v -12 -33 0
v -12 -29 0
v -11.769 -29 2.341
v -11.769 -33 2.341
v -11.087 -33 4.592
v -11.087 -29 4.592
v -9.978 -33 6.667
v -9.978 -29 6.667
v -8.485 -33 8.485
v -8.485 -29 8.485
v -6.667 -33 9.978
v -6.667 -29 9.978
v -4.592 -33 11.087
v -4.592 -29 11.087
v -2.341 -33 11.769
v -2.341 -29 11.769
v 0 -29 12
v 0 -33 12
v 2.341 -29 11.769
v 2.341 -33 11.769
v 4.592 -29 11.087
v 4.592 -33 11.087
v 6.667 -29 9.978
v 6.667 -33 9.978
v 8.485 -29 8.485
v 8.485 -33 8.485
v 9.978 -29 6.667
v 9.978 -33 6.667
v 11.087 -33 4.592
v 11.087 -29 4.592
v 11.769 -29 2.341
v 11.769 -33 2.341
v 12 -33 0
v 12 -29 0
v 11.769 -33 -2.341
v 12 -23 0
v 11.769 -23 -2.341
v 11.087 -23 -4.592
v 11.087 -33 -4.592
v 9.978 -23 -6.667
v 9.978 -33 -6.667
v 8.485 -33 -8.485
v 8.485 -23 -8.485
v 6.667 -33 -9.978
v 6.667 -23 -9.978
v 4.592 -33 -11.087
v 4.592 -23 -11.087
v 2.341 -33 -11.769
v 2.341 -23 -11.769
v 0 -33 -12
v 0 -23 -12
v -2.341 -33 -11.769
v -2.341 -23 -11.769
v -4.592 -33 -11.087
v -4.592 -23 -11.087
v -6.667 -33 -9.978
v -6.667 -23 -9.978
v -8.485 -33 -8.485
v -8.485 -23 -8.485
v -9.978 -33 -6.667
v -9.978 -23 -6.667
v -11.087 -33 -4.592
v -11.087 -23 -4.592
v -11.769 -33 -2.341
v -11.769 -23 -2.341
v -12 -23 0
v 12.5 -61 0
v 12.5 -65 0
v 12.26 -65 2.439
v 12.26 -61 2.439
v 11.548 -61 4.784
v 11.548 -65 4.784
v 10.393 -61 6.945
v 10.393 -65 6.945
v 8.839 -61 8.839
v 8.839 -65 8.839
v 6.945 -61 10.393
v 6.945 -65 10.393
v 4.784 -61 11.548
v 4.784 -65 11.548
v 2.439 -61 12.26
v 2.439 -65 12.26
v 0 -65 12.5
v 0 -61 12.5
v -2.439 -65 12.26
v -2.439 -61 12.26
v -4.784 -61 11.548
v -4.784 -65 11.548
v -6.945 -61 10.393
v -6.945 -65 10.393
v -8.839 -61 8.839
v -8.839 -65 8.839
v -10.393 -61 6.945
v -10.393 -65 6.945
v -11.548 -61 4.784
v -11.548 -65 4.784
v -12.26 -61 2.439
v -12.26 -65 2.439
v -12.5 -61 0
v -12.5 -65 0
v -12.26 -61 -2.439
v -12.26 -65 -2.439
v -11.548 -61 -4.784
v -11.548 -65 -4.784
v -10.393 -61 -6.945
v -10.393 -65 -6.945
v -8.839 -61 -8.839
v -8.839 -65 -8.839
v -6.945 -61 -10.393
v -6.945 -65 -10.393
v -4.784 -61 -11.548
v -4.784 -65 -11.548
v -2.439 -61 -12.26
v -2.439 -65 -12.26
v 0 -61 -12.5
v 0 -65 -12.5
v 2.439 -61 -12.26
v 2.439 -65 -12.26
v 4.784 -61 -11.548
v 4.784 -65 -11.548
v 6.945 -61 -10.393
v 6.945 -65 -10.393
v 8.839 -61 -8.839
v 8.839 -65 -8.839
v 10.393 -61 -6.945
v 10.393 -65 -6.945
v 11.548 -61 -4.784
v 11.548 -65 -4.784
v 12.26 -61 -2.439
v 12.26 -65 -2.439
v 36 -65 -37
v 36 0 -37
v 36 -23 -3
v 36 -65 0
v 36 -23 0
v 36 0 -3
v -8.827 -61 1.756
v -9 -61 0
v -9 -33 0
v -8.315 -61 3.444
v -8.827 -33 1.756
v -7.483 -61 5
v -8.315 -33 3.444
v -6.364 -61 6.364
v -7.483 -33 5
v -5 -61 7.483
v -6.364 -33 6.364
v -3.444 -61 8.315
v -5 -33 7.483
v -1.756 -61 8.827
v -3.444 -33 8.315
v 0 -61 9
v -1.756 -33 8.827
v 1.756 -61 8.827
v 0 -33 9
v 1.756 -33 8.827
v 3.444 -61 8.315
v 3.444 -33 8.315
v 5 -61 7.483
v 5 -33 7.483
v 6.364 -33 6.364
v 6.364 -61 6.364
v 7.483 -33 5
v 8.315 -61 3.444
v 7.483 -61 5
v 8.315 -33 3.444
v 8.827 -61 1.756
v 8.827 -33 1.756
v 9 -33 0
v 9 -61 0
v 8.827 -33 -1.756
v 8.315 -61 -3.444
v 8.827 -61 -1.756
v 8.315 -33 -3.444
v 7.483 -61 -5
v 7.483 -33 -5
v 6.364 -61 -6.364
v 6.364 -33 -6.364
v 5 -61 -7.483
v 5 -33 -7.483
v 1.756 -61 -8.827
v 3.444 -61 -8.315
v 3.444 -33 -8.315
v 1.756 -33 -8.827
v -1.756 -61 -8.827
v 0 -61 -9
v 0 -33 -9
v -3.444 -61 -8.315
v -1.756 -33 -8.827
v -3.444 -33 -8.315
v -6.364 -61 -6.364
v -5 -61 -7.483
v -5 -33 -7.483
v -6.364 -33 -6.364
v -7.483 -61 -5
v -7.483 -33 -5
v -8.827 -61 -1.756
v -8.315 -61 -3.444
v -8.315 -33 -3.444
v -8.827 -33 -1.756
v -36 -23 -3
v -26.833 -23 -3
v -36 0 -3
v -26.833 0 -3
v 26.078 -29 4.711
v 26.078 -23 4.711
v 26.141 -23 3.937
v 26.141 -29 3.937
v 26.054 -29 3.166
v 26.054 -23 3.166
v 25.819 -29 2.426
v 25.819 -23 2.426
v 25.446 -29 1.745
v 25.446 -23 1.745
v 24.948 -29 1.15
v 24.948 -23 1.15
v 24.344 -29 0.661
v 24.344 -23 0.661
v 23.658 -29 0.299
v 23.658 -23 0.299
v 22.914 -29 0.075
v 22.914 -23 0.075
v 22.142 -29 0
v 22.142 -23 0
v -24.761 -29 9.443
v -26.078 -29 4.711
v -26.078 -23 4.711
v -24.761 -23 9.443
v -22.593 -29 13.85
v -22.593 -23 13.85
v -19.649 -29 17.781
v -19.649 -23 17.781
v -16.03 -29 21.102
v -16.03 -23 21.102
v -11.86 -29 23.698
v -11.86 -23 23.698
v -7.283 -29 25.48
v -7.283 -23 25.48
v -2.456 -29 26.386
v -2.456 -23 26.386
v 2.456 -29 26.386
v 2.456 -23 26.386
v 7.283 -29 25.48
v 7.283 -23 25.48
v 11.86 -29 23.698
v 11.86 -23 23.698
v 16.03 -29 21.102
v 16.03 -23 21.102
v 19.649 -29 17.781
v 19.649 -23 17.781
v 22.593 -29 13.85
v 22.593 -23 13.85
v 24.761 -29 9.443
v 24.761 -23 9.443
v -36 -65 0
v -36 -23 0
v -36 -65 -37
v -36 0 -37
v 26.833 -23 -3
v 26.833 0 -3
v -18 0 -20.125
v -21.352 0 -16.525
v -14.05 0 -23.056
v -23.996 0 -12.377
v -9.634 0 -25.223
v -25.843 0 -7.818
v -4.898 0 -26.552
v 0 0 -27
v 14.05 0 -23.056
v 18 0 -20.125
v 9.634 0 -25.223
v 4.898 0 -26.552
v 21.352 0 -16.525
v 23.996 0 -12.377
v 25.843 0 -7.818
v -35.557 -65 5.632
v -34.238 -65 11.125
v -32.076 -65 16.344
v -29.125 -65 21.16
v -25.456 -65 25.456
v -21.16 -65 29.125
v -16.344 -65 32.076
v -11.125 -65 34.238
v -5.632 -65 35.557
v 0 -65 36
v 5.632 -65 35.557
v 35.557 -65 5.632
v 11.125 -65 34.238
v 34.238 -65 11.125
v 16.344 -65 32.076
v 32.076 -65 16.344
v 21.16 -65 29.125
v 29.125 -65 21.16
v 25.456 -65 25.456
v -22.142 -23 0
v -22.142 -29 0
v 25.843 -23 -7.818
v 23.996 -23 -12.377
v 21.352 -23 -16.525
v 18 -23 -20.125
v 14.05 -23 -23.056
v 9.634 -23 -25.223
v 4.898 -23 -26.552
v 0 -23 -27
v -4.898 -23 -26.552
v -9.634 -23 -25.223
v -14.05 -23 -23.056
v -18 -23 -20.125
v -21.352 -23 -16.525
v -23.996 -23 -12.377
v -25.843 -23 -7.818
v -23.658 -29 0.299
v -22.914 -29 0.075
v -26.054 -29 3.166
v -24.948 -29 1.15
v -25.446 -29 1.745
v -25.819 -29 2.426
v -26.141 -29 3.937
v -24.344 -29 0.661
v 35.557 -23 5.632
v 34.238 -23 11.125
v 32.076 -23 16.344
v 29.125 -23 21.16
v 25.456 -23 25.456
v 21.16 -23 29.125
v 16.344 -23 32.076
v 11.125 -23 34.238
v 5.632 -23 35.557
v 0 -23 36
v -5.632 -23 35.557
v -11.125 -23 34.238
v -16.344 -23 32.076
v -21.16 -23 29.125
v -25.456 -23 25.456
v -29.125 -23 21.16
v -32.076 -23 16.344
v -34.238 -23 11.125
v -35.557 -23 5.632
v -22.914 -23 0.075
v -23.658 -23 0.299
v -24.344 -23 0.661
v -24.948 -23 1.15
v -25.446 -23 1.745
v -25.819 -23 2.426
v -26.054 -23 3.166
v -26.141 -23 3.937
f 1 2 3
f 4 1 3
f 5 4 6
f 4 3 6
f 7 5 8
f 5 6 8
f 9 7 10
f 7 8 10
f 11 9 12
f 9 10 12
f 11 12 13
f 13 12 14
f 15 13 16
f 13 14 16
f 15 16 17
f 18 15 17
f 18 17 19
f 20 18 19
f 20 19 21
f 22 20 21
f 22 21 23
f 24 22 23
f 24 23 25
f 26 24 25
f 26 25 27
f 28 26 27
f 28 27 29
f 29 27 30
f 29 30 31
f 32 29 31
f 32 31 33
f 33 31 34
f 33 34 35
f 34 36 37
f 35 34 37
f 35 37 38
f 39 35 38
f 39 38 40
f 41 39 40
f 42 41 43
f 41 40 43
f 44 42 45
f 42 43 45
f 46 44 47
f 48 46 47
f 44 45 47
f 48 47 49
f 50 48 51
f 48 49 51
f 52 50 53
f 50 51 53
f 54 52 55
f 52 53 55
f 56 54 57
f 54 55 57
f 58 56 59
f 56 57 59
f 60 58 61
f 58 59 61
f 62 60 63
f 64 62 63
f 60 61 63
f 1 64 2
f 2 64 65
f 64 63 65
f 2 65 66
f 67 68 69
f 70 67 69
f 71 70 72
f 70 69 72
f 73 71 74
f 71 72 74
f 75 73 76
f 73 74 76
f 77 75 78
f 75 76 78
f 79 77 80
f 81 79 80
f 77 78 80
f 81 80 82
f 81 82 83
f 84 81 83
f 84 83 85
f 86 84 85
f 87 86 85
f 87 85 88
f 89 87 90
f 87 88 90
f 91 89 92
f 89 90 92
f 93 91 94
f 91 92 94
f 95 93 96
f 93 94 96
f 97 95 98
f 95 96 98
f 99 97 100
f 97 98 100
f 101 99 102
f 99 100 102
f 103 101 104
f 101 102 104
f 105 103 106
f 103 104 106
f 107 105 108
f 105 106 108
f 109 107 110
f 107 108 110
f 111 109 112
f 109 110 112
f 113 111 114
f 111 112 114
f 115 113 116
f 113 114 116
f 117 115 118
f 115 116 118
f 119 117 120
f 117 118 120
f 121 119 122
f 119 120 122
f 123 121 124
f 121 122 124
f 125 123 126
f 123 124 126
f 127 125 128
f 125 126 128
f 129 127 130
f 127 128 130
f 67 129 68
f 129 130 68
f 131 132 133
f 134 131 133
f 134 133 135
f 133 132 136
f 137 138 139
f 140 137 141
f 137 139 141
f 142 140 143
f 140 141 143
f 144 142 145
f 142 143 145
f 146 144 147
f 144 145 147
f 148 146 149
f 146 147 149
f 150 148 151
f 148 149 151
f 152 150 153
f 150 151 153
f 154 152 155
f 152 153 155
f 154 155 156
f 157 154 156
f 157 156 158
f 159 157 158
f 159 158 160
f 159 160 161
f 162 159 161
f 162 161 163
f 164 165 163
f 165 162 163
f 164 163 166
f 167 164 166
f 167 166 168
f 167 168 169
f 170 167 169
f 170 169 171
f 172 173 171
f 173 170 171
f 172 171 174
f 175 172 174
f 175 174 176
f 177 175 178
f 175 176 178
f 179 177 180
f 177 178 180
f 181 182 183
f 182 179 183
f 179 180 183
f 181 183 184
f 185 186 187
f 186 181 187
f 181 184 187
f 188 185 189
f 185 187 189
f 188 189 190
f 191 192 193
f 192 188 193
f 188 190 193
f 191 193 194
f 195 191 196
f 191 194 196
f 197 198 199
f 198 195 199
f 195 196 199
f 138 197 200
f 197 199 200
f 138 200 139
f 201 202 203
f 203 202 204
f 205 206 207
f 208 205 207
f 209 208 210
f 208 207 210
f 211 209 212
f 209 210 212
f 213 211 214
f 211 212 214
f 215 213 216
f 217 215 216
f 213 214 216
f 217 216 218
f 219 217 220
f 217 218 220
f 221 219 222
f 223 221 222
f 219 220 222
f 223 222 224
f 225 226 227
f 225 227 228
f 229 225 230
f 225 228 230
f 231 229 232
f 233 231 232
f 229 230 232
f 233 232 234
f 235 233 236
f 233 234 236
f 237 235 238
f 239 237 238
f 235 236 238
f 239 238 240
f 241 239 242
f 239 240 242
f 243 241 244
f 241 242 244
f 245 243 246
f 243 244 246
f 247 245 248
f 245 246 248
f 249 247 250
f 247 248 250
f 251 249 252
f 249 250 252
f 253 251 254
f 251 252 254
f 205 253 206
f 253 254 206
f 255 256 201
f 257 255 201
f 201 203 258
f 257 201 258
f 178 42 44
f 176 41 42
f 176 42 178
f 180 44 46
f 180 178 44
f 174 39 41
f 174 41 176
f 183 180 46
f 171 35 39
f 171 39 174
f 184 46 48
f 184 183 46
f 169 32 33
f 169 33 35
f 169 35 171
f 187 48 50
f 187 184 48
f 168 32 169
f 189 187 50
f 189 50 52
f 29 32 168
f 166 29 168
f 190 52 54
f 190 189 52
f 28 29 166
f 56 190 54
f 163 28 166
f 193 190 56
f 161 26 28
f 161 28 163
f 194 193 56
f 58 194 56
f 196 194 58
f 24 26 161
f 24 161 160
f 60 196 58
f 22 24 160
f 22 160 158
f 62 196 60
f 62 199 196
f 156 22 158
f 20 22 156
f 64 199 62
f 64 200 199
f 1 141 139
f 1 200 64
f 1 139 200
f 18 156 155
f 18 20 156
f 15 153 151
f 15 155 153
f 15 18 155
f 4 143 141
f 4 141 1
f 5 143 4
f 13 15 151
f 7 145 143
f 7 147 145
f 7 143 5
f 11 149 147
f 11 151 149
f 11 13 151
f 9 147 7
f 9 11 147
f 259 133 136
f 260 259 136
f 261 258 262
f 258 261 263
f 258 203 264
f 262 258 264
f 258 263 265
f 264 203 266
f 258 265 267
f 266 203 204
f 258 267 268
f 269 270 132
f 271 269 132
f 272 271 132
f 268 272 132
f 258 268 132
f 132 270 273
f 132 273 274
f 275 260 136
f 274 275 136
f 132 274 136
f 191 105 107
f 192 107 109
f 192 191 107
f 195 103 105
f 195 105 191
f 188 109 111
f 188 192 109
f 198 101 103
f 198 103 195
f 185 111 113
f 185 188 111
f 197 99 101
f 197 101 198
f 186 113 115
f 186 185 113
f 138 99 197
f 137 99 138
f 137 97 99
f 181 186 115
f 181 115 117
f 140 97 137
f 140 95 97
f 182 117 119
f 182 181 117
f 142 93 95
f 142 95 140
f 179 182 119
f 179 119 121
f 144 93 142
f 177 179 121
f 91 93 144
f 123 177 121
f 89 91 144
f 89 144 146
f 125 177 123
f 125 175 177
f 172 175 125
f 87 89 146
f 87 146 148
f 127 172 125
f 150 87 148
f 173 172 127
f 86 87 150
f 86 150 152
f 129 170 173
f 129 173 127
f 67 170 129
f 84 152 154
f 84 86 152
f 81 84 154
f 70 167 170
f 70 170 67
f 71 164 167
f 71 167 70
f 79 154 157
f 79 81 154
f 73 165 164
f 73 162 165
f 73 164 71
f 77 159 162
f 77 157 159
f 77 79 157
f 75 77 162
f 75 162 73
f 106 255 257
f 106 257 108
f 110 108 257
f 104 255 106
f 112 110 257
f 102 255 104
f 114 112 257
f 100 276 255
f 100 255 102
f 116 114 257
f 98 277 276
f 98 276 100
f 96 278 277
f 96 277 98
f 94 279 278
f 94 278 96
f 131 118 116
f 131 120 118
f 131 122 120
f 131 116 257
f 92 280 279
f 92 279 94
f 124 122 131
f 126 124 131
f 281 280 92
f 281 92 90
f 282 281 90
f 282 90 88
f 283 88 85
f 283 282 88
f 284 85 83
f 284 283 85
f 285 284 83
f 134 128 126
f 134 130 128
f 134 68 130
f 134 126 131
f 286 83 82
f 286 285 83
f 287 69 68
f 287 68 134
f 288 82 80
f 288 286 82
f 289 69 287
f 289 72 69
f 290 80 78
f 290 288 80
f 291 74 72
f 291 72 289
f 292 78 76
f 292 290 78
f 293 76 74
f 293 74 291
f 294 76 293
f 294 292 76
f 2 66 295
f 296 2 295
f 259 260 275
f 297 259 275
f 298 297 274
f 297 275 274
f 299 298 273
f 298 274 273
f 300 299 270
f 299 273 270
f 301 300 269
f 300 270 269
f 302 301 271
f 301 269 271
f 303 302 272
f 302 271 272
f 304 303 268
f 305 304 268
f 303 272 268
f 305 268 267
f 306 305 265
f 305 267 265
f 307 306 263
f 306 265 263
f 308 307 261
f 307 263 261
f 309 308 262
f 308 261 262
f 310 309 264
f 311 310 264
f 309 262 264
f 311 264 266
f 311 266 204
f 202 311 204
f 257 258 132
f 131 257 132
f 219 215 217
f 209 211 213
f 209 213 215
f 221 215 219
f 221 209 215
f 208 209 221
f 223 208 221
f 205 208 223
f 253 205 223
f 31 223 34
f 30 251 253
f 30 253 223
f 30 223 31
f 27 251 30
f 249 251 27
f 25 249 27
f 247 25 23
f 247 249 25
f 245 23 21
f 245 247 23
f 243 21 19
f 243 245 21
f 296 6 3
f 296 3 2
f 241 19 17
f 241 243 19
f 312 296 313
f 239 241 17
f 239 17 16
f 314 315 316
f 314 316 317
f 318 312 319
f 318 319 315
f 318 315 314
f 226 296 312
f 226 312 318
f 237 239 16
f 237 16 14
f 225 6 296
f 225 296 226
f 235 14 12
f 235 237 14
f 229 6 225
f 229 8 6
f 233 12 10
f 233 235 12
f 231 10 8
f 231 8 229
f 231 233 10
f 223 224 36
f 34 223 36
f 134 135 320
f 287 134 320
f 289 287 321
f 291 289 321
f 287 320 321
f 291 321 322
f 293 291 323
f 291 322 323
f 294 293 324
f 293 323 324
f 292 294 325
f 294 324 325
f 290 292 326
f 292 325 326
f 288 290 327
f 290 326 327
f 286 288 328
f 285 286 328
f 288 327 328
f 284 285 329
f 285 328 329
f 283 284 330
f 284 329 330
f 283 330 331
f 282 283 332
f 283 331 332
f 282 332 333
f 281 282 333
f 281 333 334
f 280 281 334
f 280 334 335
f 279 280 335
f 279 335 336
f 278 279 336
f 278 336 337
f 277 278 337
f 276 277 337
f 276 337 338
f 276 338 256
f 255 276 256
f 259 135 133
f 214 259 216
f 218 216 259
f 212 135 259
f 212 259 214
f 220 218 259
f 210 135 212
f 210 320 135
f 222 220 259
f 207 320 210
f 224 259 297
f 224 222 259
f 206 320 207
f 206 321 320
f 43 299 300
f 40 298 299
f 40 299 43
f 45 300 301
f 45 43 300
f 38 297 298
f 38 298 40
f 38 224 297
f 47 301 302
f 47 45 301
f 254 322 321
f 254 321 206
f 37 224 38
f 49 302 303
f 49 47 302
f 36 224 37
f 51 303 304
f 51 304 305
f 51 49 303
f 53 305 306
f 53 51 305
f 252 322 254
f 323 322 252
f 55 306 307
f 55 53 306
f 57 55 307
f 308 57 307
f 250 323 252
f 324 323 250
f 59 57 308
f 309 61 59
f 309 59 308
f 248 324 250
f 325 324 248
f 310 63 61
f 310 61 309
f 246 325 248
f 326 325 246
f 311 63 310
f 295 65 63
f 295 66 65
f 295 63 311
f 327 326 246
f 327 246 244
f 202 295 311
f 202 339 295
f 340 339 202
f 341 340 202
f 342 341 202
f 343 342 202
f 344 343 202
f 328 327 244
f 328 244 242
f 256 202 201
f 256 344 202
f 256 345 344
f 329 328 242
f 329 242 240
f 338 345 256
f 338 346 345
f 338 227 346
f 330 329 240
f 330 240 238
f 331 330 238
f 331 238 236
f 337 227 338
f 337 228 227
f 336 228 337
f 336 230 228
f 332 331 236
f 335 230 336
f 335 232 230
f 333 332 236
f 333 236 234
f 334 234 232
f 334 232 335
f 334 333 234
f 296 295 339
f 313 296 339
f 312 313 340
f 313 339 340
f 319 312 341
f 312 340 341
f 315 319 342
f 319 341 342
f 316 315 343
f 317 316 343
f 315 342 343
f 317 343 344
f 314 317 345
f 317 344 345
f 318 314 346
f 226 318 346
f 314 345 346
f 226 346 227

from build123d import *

# Parameters (mm, degrees)
F1_DEPTH  = 65
F2_R      = 12.5
F2_R_2    = 9
F3_DEPTH  = 4
F4_W      = 23
F4_H      = 40
F4_H_2    = 3
F5_DEPTH  = 72
F7_DEPTH  = 23
F8_R      = 12
F8_R_2    = 9
F9_DEPTH  = 10
F11_DEPTH = 6


with BuildPart() as f1:
    # F0 (on Front) → F1 (new body)
    with BuildSketch(Plane.XZ):
        with BuildLine():
            Line((36, 0), (9, 0))
            ThreePointArc((9, 0), (0, -9), (-9, 0))
            Line((-9, 0), (-36, 0))
            ThreePointArc((-36, 0), (0, -36), (36, 0))
        make_face()
        with BuildLine():
            ThreePointArc((-9, 0), (0, 9), (9, 0))
            Line((9, 0), (36, 0))
            ThreePointArc((36, 0), (0, 36), (-36, 0))
            Line((-36, 0), (-9, 0))
        make_face()
        with BuildLine():
            Line((36, -37), (36, 0))
            ThreePointArc((36, 0), (0, -36), (-36, 0))
            Line((-36, 0), (-36, -37))
            Line((-36, -37), (36, -37))
        make_face()
    extrude(amount=F1_DEPTH)

    # F2 (on face) → F3 (cut)
    with BuildSketch(Plane.XZ.offset(65)):
        Circle(F2_R)
        Circle(F2_R_2, mode=Mode.SUBTRACT)
    extrude(amount=-F3_DEPTH, mode=Mode.SUBTRACT)

    # F4 (on face) → F5 (cut)
    with BuildSketch(Plane.YZ.offset(36)):
        with Locations((-11.5, 20)):
            Rectangle(F4_W, F4_H)
        with Locations((-11.5, -1.5)):
            Rectangle(F4_W, F4_H_2)
    extrude(amount=-F5_DEPTH, mode=Mode.SUBTRACT)

    # F6 (on face) → F7 (cut)
    with BuildSketch(Plane(origin=(0, 0, 0), x_dir=(-1, 0, 0), z_dir=(0, 1, 0))):
        with BuildLine():
            ThreePointArc((26.83281573, -3), (26.9581715321, -1.5023274094), (27, 0))
            ThreePointArc((27, 0), (-1.5023274094, 26.9581715321), (-26.83281573, -3))
            Line((-26.83281573, -3), (-8.4852813742, -3))
            ThreePointArc((-8.4852813742, -3), (0, -9), (8.4852813742, -3))
            Line((8.4852813742, -3), (26.83281573, -3))
        make_face()
        with BuildLine():
            Line((-8.4852813742, -3), (-26.83281573, -3))
            ThreePointArc((-26.83281573, -3), (0, -27), (26.83281573, -3))
            Line((26.83281573, -3), (8.4852813742, -3))
            ThreePointArc((8.4852813742, -3), (0, -9), (-8.4852813742, -3))
        make_face()
    extrude(amount=-F7_DEPTH, mode=Mode.SUBTRACT)

    # F8 (on face) → F9 (cut)
    with BuildSketch(Plane(origin=(0, -23, 0), x_dir=(-1, 0, 0), z_dir=(0, 1, 0))):
        Circle(F8_R)
        Circle(F8_R_2, mode=Mode.SUBTRACT)
    extrude(amount=-F9_DEPTH, mode=Mode.SUBTRACT)

    # F10 (on face) → F11 (cut)
    with BuildSketch(Plane(origin=(0, -23, 0), x_dir=(-1, 0, 0), z_dir=(0, 1, 0))):
        with BuildLine():
            ThreePointArc((22.1415898255, 0), (25.2111536743, 1.4352821251), (26.0778724611, 4.7111111111))
            ThreePointArc((26.0778724611, 4.7111111111), (0, 26.5), (-26.0778724611, 4.7111111111))
            ThreePointArc((-26.0778724611, 4.7111111111), (-25.2111536743, 1.4352821251), (-22.1415898255, 0))
            Line((-22.1415898255, 0), (-12, 0))
            ThreePointArc((-12, 0), (0, 12), (12, 0))
            Line((12, 0), (22.1415898255, 0))
        make_face()
    extrude(amount=-F11_DEPTH, mode=Mode.SUBTRACT)


solid = f1.part
